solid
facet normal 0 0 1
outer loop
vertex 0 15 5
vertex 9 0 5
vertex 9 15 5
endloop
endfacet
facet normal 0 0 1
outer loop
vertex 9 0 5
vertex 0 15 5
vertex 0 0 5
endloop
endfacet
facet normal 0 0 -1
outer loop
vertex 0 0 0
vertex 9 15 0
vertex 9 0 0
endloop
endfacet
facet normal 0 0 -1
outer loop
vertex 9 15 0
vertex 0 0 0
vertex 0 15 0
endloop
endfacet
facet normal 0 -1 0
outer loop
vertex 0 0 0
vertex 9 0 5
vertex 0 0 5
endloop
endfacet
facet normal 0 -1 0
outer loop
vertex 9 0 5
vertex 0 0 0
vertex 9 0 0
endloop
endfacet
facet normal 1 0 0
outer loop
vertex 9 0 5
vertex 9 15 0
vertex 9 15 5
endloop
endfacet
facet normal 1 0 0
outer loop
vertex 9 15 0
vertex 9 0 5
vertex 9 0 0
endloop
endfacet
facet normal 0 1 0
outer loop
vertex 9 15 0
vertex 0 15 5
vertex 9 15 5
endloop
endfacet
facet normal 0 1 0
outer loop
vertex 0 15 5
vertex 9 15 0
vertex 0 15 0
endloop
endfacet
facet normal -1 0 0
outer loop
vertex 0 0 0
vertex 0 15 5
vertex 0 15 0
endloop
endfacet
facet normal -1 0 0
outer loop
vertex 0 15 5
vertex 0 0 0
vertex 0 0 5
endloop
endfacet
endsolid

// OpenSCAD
// Generated by SolidPython 1.0.1 on 2020-07-29 00:46:55


cube(size = [9, 15, 5]);
/***********************************************
*********      SolidPython code:      **********
************************************************
 
# import packages: SolidPython
from solid import *
from solid.utils import *
from itertools import chain, combinations, permutations


class Resize:

    def __init__(self, scad_file):
        self.scad_file = scad_file
        #self.scad_file = import_scad(scad_file)
        # cone/cylinder param:
        self.r1 = 0
        self.r2 = 0
        self.h = 0
        # rectangular prism param:
        self.w = 0
        self.l = 0
        # ellipse param:
        self.r = 0

    # import OpenScad code (file name corresponds to shape)


    # classify shape + parameters
    def assign(self, param1, param2, param3):
        if self.scad_file == 'cone.scad':
            self.r1 = param1
            self.r2 = param2
            self.h = param3
        elif self.scad_file == 'cylinder.scad':
            self.r1 = param1
            self.r2 = param2
            self.h = param3
        elif self.scad_file == 'rectangularPrism.scad':
            self.h = param1
            self.l = param2
            self.w = param3
        else:
            self.r = param1
            self.h = param2

    # resize parameters
    def iterate(self):
        x = range(3, 20, 2)
        i = 1
        if self.scad_file == 'cone.scad':
            tempList = list(permutations(x, 2))
            for temp in tempList:
                param1 = temp[0]
                param2 = temp[1]
                filepath = 'produced_scad_files/' + 'cone' + str(param1) + '_' + str(param2) + '_' + '.scad'
                scad_render_to_file(cylinder(h=param1, r1=param2, r2=0), filepath)

        elif self.scad_file == 'cylinder.scad':
            tempList = list(permutations(x, 3))
            for temp in tempList:
                param1 = temp[0]
                param2 = temp[1]
                filepath = 'produced_scad_files/' + 'cylinder' + str(param1) + '_' + str(param2) + '_' + '.scad'
                scad_render_to_file(cylinder(h=param1, r1=param2, r2=param2), filepath)

        elif self.scad_file == 'rectangularPrism.scad':
            tempList = list(permutations(x, 3))
            for temp in tempList:
                param1 = temp[0]
                param2 = temp[1]
                param3 = temp[2]
                filepath = 'produced_scad_files/' + 'rectangularPrism' + str(param1) + '_' + str(param2) + '_' + str(
                    param3) + '.scad'
                scad_render_to_file(cube(size=(param1, param2, param3)), filepath)

        elif self.scad_file == 'ellipse.scad':
            tempList = list(permutations(x, 4))
            for temp in tempList:
                param1 = temp[0]
                param2 = temp[1]
                param3 = temp[2]
                param4 = temp[3]
                filepath = 'produced_scad_files/' + 'ellipse' + str(param1) + '_' + str(param2) + '_' + str(param3) + '_' + str(param4) + '.scad'
                scad_render_to_file(scale([param1, param2, param3])(sphere(r=param4)), filepath)

    def render_to_scadfile(self):
        scad_render_to_file(scad, 'example.scad') 
 
************************************************/
